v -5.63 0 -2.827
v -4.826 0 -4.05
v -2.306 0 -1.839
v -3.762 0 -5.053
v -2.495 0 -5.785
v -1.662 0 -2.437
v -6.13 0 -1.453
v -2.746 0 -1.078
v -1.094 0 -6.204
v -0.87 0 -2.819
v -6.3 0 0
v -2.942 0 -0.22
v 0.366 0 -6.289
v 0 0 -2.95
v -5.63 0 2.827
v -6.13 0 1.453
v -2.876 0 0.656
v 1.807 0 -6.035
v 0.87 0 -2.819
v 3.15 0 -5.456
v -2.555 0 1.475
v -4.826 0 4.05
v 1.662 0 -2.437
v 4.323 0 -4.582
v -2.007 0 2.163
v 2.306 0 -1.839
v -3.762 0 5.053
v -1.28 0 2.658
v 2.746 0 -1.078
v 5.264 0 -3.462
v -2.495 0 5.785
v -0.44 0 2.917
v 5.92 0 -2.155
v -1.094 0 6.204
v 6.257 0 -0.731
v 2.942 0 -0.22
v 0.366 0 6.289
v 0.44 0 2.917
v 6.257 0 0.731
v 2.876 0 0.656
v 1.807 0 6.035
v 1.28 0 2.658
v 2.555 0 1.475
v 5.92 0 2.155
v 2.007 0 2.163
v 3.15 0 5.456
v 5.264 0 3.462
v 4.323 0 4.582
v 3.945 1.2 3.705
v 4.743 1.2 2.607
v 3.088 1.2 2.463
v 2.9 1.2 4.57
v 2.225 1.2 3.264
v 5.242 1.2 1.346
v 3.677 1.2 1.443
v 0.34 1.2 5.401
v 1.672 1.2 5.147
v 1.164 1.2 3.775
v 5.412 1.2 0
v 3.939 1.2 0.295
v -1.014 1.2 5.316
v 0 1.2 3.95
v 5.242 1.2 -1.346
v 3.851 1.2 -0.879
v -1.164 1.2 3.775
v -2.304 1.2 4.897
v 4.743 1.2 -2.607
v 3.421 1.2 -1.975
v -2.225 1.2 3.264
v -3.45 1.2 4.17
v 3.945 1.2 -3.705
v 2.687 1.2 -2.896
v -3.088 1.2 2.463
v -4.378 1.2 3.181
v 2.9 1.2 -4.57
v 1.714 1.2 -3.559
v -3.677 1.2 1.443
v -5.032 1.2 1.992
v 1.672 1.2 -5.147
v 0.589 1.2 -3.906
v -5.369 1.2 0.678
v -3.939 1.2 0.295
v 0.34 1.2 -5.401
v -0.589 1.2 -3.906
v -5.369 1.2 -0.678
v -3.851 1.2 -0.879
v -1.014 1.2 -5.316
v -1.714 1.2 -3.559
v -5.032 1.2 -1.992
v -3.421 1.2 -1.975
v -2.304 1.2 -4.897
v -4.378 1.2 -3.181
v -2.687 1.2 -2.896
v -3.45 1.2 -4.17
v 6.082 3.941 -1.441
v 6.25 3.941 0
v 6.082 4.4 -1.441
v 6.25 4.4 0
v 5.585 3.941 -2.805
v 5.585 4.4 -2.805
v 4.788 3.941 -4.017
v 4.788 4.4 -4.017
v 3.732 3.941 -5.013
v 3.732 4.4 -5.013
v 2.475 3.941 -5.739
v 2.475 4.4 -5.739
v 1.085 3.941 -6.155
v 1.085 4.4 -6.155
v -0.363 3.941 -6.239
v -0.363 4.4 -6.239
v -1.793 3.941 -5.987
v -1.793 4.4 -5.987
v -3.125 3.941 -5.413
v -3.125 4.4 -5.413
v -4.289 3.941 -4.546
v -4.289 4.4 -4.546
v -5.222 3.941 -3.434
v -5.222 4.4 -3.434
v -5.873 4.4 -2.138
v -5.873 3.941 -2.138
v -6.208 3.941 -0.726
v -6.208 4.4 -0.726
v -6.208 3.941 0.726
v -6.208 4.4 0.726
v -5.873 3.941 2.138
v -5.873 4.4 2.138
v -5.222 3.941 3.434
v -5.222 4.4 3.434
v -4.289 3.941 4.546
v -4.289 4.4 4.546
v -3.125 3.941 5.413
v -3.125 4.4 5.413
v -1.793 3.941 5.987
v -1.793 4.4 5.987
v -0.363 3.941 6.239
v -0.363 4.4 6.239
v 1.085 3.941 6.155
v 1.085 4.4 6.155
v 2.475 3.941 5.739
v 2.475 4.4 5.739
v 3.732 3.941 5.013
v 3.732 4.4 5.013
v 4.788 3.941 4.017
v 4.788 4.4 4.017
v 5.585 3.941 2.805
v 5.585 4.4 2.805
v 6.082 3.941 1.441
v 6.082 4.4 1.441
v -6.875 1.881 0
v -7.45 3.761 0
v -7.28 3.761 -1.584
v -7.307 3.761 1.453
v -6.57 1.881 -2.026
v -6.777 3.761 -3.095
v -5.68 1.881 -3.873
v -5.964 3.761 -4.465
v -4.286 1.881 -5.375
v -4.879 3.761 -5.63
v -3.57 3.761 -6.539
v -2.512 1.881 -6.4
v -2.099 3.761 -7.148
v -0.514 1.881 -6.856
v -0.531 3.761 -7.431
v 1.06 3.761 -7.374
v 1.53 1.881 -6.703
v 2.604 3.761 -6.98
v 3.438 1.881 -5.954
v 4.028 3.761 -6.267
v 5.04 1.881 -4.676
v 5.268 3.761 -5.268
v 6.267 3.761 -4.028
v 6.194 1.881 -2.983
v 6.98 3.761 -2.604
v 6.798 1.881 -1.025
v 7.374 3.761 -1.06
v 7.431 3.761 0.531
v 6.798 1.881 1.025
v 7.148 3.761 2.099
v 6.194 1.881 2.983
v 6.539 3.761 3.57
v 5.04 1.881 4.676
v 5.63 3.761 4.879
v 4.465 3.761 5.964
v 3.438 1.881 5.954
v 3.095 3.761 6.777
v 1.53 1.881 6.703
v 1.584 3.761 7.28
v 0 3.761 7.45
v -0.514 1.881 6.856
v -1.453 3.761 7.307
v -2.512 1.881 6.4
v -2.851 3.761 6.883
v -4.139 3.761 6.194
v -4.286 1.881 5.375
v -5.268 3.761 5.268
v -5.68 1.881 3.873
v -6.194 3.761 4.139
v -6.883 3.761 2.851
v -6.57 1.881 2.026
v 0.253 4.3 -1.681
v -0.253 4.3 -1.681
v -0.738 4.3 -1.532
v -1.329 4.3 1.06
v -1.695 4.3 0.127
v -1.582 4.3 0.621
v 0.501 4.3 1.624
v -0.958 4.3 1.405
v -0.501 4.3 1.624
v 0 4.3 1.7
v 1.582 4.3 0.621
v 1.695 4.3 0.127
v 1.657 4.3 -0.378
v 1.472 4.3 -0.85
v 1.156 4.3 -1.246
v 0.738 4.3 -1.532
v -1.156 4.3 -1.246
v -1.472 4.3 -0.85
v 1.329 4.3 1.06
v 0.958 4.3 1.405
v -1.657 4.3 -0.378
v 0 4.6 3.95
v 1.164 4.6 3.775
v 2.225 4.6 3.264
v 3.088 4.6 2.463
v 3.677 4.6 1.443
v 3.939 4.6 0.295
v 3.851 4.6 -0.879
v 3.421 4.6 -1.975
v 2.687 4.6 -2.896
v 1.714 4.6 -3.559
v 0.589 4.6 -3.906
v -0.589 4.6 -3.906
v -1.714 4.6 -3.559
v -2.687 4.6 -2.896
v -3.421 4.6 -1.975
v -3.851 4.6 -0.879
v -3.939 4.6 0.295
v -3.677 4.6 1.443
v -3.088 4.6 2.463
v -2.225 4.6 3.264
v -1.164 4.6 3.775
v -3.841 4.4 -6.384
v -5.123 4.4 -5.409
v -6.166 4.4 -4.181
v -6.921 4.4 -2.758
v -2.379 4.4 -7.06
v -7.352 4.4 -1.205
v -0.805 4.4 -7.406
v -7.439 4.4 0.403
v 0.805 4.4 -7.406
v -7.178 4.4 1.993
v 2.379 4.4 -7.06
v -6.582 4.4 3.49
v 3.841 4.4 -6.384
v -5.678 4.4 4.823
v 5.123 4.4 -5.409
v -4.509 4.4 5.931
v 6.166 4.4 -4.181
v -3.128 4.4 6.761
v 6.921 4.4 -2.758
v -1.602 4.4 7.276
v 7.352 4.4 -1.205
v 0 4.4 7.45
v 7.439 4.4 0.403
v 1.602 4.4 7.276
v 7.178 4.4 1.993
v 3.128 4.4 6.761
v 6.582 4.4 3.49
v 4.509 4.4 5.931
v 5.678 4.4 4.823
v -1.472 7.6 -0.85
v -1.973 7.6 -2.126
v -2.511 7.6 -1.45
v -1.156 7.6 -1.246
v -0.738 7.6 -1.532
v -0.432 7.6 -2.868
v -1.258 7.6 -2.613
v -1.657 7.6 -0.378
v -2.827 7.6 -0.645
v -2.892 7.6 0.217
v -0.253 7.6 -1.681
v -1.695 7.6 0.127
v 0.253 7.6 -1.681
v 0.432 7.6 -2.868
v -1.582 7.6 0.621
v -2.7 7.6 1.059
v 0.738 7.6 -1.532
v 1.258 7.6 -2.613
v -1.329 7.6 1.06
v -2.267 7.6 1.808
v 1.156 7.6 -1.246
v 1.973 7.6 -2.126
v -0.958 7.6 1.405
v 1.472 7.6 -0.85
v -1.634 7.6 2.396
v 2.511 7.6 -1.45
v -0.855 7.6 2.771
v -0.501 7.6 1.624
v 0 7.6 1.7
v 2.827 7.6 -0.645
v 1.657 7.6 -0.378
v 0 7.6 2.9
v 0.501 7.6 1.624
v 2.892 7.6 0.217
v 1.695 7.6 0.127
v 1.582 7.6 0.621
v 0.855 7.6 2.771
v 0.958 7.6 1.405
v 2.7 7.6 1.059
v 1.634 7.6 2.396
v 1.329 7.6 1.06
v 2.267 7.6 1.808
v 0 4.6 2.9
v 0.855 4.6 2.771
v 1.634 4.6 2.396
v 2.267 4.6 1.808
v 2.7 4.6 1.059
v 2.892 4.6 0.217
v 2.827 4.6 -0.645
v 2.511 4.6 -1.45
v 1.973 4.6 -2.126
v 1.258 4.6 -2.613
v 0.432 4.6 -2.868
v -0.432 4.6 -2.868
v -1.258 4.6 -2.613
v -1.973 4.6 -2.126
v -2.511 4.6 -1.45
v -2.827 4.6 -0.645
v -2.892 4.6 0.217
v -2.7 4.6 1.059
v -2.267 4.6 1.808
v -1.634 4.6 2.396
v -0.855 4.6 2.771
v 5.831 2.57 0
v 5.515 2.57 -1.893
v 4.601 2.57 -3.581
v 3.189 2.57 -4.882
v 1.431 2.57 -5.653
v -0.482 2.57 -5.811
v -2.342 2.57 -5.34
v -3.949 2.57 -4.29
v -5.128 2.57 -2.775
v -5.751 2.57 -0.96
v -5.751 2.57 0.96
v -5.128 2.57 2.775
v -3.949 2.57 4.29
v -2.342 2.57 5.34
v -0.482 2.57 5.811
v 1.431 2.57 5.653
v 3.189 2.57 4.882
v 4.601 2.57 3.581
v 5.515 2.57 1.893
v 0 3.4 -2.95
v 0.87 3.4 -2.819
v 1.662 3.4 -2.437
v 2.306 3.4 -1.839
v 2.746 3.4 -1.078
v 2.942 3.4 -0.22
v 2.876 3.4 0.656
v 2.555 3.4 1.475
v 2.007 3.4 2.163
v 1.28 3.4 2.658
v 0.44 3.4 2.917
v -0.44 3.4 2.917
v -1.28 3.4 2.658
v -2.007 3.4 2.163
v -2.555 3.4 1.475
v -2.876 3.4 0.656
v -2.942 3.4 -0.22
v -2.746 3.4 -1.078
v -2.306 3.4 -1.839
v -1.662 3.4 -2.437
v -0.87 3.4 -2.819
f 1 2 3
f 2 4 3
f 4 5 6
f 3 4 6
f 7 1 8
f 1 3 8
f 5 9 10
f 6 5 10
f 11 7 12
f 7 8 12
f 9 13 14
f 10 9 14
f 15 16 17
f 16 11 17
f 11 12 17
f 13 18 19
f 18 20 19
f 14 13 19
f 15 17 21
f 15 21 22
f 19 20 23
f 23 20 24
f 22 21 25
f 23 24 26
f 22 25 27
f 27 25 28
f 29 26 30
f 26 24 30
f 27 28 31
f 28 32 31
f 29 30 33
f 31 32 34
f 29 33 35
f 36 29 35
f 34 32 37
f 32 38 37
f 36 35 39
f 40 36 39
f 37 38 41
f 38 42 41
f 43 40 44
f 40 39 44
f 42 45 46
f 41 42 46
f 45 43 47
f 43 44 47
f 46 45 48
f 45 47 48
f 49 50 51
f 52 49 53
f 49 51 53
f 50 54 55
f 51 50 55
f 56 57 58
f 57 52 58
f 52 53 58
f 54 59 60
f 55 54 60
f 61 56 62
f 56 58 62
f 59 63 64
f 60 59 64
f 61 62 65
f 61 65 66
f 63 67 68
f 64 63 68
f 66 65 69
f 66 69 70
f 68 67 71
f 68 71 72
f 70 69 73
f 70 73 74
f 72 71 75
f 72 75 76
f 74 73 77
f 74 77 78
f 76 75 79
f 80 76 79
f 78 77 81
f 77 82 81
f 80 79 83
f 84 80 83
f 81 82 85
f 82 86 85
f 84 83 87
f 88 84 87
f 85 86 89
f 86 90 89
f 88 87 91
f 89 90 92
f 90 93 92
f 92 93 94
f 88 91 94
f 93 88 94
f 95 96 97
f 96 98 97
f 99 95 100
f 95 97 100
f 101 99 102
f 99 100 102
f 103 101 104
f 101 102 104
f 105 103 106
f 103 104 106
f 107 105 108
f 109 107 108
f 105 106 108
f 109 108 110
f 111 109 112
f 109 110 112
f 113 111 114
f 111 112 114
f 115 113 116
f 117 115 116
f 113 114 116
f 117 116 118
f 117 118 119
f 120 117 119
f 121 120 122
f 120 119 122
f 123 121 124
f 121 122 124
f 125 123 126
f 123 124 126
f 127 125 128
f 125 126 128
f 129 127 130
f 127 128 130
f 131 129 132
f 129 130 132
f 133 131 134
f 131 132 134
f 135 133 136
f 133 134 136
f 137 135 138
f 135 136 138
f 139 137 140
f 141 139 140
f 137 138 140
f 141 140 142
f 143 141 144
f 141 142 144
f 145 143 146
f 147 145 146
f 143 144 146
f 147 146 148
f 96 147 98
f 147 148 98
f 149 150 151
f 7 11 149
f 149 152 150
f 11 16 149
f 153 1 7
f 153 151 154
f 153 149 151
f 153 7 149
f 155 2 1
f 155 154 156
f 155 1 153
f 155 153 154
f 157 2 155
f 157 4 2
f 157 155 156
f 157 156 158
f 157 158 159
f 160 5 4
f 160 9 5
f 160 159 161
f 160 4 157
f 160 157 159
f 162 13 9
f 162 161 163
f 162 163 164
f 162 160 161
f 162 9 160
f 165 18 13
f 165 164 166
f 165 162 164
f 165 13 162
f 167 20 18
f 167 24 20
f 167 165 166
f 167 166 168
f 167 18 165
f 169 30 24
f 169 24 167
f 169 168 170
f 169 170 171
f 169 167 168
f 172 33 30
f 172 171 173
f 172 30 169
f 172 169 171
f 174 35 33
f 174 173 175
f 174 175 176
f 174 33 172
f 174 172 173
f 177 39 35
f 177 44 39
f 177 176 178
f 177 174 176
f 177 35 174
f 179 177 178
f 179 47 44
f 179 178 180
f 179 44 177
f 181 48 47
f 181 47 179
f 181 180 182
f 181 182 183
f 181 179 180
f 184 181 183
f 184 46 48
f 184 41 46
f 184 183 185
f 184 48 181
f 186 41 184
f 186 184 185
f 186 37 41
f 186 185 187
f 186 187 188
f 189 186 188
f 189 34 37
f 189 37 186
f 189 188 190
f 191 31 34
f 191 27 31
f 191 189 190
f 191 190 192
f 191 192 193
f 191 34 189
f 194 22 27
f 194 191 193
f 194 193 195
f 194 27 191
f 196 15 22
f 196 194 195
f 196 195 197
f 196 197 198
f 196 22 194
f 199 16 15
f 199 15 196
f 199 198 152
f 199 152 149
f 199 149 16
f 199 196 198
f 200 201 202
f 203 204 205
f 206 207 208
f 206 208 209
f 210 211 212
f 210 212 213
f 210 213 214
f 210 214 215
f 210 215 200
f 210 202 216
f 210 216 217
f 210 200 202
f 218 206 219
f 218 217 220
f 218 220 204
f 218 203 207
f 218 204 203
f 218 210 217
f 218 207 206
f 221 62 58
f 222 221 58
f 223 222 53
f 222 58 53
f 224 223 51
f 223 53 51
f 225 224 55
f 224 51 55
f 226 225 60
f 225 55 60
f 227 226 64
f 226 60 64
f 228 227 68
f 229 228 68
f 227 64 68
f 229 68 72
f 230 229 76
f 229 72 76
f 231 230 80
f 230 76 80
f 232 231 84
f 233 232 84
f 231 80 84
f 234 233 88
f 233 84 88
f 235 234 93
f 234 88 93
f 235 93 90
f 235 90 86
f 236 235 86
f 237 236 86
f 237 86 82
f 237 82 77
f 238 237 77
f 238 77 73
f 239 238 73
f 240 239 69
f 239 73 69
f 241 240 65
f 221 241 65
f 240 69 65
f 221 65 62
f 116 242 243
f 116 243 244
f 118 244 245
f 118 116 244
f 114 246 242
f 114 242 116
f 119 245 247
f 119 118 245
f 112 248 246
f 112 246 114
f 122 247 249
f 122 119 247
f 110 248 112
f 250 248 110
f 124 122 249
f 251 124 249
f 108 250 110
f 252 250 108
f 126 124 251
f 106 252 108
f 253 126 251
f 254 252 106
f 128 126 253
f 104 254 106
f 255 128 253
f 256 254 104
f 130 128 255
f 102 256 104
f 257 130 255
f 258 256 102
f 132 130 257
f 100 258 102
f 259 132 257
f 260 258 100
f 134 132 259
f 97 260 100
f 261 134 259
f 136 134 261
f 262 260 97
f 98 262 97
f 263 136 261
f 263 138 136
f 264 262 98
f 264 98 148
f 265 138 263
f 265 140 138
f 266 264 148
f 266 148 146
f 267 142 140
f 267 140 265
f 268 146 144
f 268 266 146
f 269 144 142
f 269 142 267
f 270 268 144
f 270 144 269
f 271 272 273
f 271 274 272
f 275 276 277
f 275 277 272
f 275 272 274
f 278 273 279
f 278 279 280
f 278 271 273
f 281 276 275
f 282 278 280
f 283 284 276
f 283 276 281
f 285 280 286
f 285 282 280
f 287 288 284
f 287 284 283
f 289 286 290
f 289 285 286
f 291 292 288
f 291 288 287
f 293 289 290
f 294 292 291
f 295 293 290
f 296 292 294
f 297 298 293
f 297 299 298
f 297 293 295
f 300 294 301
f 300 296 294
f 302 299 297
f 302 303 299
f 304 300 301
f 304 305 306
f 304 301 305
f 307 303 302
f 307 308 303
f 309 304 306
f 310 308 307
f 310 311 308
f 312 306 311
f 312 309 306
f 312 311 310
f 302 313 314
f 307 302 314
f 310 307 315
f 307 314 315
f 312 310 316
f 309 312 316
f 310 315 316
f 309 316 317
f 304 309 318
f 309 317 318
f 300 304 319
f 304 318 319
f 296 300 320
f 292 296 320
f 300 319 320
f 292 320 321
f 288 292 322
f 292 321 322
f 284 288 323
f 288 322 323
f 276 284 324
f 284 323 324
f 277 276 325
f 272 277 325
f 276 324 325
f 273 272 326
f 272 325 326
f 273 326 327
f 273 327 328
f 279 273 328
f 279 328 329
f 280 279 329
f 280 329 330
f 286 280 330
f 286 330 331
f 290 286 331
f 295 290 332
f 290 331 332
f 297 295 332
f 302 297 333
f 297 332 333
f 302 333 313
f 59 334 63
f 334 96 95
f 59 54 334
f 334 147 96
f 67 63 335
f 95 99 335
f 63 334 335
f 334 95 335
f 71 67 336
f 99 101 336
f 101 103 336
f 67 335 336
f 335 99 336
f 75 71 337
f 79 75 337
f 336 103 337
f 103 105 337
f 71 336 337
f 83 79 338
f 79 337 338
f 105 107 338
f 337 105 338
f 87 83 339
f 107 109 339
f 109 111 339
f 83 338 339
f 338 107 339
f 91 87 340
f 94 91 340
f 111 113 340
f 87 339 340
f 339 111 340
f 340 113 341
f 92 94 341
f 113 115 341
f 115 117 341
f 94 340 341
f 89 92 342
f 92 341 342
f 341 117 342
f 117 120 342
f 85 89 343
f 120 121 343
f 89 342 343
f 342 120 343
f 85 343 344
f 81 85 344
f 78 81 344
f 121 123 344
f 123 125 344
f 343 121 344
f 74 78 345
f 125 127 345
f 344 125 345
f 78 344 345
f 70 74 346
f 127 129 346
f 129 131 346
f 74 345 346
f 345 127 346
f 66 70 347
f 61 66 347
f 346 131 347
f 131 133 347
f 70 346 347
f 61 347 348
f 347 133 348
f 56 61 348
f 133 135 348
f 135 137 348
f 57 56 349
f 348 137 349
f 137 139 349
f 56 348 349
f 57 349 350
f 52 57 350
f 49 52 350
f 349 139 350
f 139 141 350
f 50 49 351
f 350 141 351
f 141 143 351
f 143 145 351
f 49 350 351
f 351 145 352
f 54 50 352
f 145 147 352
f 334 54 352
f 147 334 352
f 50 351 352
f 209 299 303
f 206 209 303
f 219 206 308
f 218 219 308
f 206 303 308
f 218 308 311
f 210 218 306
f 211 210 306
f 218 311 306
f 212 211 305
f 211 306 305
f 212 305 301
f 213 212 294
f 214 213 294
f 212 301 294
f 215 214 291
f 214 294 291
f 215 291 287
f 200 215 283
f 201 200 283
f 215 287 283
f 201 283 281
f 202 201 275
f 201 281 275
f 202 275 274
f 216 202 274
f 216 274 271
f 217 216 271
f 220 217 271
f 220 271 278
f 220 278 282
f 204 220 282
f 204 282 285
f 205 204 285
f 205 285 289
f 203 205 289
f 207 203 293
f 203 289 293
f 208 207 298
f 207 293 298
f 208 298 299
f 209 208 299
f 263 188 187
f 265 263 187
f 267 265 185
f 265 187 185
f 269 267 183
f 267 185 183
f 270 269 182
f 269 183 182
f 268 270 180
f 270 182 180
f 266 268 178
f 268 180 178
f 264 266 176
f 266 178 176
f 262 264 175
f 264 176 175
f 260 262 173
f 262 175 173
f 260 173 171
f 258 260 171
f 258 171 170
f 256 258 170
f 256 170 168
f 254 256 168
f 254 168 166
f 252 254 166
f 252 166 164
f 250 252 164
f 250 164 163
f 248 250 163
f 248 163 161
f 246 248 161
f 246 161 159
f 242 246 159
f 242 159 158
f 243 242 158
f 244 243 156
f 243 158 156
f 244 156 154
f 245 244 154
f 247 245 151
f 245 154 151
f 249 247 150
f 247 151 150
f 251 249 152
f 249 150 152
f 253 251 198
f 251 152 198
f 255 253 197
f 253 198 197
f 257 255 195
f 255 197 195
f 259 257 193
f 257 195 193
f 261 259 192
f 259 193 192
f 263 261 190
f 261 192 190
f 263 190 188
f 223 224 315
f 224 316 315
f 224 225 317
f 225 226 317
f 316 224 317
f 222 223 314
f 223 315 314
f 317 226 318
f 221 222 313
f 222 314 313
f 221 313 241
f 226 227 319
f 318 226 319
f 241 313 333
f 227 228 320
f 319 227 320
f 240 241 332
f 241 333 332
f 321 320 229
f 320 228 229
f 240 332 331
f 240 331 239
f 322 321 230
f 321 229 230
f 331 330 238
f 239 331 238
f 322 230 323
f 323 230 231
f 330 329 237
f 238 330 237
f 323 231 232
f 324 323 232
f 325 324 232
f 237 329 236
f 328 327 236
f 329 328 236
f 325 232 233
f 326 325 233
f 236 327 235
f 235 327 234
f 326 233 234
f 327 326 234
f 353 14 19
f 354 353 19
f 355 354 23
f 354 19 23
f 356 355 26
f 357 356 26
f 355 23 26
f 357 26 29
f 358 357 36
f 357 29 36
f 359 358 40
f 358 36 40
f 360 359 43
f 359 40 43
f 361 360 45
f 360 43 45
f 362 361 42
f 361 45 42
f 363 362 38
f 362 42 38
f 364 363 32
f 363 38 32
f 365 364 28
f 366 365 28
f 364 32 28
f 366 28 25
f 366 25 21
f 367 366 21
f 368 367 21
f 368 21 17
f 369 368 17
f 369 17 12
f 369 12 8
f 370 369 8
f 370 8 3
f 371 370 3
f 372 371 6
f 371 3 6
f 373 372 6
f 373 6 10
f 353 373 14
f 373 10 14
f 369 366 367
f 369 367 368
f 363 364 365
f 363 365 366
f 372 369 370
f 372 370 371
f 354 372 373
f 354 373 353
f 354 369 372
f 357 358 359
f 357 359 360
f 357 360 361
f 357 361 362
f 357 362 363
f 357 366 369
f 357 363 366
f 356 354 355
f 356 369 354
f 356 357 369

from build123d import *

# Parameters (mm, degrees)
SKETCH1_R           = 7.45
BOSS_EXTRUDE1_DEPTH = 4.4
SKETCH2_R           = 2.95
CUT_EXTRUDE1_DEPTH  = 3.4
SKETCH3_OUTSIDE_W   = 24.262
SKETCH3_OUTSIDE_H   = 24.262
SKETCH3_OUTSIDE_R   = 6.3
CUT_EXTRUDE2_DEPTH  = 5
CUT_EXTRUDE2_DRAFT  = -17
SHELL1_2_OUTLINE_W  = 4.15
SHELL1_2_OUTLINE_H  = 0.2
CUT_EXTRUDE3_START  = -3.4
SKETCH4_R           = 4.15
SKETCH4_R_2         = 3.95
CUT_EXTRUDE3_DEPTH  = 3.4
SKETCH5_R           = 2.9
BOSS_EXTRUDE2_DEPTH = 3
SKETCH6_R           = 1.7
CUT_EXTRUDE4_DEPTH  = 3.3


# Read off the part's stored shape, not the designer's step: Shell1
with BuildPart() as part:
    # Sketch1 → Boss-Extrude1 (new body)
    with BuildSketch(Plane(origin=(0, 0, 0), x_dir=(1, 0, 0), z_dir=(0, 1, 0))):
        with Locations(Location((0, 0, 0), (0, 0, 270))):
            Circle(SKETCH1_R)
    extrude(amount=BOSS_EXTRUDE1_DEPTH)

    # Sketch2 → Cut-Extrude1 (cut)
    with BuildSketch(Plane.XZ):
        with Locations(Location((0, 0, 0), (0, 0, 270))):
            Circle(SKETCH2_R)
    extrude(amount=-CUT_EXTRUDE1_DEPTH, mode=Mode.SUBTRACT)


with BuildPart() as cut_extrude2_tool:
    # Sketch3 outside → Cut-Extrude2 (with draft: the straight prism first)
    with BuildSketch(Plane(origin=(0, 0, 0), x_dir=(-1, 0, 0), z_dir=(0, -1, 0))):
        Rectangle(SKETCH3_OUTSIDE_W, SKETCH3_OUTSIDE_H)
        Circle(SKETCH3_OUTSIDE_R, mode=Mode.SUBTRACT)
    extrude(amount=-CUT_EXTRUDE2_DEPTH)
    # Cut-Extrude2: the draft: its side faces are tilted about the plane it starts from
    cut_extrude2_sides = [cut_extrude2_tool.faces().sort_by_distance(p)[0] for p in [
        (0, 2.5, 12.131),
        (-12.131, 2.5, 0),
        (0, 2.5, -12.131),
        (12.131, 2.5, 0),
        (6.3, 2.5, 0),
    ]]
    draft(cut_extrude2_sides, Plane(origin=(0, 0, 0), x_dir=(-1, 0, 0), z_dir=(0, -1, 0)), CUT_EXTRUDE2_DRAFT)


with BuildPart() as part_1:
    add(part.part)

    # Cut-Extrude2: cut by cut_extrude2_tool
    add(cut_extrude2_tool.part, mode=Mode.SUBTRACT)

    # Shell1 outline → Shell1 (revolve, cut)
    with BuildSketch(Plane.XY):
        Polygon((4.15, 4.4), (4.15, 1.2), (5.41204671, 1.2), (6.25, 3.940821713), (6.25, 4.4), align=None)
    revolve(axis=Axis((0, 0, 0), (0, 1, 0)), mode=Mode.SUBTRACT)

    # Shell1 2 outline → Shell1 2 (revolve)
    with BuildSketch(Plane.XY):
        with Locations((2.075, 4.5)):
            Rectangle(SHELL1_2_OUTLINE_W, SHELL1_2_OUTLINE_H)
    revolve(axis=Axis((0, 0, 0), (0, 1, 0)))

    # Sketch4 → Cut-Extrude3 (cut)
    with BuildSketch(Plane(origin=(0, 4.6, 0), x_dir=(1, 0, 0), z_dir=(0, 1, 0)).offset(CUT_EXTRUDE3_START)):
        Circle(SKETCH4_R)
        with Locations(Location((0, 0, 0), (0, 0, 270))):
            Circle(SKETCH4_R_2, mode=Mode.SUBTRACT)
    extrude(amount=CUT_EXTRUDE3_DEPTH, mode=Mode.SUBTRACT)

    # Sketch5 → Boss-Extrude2 (add)
    with BuildSketch(Plane(origin=(0, 4.6, 0), x_dir=(1, 0, 0), z_dir=(0, 1, 0))):
        with Locations(Location((0, 0, 0), (0, 0, 270))):
            Circle(SKETCH5_R)
    extrude(amount=BOSS_EXTRUDE2_DEPTH)

    # Sketch6 → Cut-Extrude4 (cut)
    with BuildSketch(Plane(origin=(0, 7.6, 0), x_dir=(1, 0, 0), z_dir=(0, 1, 0))):
        with Locations(Location((0, 0, 0), (0, 0, 270))):
            Circle(SKETCH6_R)
    extrude(amount=-CUT_EXTRUDE4_DEPTH, mode=Mode.SUBTRACT)


solid = part_1.part
